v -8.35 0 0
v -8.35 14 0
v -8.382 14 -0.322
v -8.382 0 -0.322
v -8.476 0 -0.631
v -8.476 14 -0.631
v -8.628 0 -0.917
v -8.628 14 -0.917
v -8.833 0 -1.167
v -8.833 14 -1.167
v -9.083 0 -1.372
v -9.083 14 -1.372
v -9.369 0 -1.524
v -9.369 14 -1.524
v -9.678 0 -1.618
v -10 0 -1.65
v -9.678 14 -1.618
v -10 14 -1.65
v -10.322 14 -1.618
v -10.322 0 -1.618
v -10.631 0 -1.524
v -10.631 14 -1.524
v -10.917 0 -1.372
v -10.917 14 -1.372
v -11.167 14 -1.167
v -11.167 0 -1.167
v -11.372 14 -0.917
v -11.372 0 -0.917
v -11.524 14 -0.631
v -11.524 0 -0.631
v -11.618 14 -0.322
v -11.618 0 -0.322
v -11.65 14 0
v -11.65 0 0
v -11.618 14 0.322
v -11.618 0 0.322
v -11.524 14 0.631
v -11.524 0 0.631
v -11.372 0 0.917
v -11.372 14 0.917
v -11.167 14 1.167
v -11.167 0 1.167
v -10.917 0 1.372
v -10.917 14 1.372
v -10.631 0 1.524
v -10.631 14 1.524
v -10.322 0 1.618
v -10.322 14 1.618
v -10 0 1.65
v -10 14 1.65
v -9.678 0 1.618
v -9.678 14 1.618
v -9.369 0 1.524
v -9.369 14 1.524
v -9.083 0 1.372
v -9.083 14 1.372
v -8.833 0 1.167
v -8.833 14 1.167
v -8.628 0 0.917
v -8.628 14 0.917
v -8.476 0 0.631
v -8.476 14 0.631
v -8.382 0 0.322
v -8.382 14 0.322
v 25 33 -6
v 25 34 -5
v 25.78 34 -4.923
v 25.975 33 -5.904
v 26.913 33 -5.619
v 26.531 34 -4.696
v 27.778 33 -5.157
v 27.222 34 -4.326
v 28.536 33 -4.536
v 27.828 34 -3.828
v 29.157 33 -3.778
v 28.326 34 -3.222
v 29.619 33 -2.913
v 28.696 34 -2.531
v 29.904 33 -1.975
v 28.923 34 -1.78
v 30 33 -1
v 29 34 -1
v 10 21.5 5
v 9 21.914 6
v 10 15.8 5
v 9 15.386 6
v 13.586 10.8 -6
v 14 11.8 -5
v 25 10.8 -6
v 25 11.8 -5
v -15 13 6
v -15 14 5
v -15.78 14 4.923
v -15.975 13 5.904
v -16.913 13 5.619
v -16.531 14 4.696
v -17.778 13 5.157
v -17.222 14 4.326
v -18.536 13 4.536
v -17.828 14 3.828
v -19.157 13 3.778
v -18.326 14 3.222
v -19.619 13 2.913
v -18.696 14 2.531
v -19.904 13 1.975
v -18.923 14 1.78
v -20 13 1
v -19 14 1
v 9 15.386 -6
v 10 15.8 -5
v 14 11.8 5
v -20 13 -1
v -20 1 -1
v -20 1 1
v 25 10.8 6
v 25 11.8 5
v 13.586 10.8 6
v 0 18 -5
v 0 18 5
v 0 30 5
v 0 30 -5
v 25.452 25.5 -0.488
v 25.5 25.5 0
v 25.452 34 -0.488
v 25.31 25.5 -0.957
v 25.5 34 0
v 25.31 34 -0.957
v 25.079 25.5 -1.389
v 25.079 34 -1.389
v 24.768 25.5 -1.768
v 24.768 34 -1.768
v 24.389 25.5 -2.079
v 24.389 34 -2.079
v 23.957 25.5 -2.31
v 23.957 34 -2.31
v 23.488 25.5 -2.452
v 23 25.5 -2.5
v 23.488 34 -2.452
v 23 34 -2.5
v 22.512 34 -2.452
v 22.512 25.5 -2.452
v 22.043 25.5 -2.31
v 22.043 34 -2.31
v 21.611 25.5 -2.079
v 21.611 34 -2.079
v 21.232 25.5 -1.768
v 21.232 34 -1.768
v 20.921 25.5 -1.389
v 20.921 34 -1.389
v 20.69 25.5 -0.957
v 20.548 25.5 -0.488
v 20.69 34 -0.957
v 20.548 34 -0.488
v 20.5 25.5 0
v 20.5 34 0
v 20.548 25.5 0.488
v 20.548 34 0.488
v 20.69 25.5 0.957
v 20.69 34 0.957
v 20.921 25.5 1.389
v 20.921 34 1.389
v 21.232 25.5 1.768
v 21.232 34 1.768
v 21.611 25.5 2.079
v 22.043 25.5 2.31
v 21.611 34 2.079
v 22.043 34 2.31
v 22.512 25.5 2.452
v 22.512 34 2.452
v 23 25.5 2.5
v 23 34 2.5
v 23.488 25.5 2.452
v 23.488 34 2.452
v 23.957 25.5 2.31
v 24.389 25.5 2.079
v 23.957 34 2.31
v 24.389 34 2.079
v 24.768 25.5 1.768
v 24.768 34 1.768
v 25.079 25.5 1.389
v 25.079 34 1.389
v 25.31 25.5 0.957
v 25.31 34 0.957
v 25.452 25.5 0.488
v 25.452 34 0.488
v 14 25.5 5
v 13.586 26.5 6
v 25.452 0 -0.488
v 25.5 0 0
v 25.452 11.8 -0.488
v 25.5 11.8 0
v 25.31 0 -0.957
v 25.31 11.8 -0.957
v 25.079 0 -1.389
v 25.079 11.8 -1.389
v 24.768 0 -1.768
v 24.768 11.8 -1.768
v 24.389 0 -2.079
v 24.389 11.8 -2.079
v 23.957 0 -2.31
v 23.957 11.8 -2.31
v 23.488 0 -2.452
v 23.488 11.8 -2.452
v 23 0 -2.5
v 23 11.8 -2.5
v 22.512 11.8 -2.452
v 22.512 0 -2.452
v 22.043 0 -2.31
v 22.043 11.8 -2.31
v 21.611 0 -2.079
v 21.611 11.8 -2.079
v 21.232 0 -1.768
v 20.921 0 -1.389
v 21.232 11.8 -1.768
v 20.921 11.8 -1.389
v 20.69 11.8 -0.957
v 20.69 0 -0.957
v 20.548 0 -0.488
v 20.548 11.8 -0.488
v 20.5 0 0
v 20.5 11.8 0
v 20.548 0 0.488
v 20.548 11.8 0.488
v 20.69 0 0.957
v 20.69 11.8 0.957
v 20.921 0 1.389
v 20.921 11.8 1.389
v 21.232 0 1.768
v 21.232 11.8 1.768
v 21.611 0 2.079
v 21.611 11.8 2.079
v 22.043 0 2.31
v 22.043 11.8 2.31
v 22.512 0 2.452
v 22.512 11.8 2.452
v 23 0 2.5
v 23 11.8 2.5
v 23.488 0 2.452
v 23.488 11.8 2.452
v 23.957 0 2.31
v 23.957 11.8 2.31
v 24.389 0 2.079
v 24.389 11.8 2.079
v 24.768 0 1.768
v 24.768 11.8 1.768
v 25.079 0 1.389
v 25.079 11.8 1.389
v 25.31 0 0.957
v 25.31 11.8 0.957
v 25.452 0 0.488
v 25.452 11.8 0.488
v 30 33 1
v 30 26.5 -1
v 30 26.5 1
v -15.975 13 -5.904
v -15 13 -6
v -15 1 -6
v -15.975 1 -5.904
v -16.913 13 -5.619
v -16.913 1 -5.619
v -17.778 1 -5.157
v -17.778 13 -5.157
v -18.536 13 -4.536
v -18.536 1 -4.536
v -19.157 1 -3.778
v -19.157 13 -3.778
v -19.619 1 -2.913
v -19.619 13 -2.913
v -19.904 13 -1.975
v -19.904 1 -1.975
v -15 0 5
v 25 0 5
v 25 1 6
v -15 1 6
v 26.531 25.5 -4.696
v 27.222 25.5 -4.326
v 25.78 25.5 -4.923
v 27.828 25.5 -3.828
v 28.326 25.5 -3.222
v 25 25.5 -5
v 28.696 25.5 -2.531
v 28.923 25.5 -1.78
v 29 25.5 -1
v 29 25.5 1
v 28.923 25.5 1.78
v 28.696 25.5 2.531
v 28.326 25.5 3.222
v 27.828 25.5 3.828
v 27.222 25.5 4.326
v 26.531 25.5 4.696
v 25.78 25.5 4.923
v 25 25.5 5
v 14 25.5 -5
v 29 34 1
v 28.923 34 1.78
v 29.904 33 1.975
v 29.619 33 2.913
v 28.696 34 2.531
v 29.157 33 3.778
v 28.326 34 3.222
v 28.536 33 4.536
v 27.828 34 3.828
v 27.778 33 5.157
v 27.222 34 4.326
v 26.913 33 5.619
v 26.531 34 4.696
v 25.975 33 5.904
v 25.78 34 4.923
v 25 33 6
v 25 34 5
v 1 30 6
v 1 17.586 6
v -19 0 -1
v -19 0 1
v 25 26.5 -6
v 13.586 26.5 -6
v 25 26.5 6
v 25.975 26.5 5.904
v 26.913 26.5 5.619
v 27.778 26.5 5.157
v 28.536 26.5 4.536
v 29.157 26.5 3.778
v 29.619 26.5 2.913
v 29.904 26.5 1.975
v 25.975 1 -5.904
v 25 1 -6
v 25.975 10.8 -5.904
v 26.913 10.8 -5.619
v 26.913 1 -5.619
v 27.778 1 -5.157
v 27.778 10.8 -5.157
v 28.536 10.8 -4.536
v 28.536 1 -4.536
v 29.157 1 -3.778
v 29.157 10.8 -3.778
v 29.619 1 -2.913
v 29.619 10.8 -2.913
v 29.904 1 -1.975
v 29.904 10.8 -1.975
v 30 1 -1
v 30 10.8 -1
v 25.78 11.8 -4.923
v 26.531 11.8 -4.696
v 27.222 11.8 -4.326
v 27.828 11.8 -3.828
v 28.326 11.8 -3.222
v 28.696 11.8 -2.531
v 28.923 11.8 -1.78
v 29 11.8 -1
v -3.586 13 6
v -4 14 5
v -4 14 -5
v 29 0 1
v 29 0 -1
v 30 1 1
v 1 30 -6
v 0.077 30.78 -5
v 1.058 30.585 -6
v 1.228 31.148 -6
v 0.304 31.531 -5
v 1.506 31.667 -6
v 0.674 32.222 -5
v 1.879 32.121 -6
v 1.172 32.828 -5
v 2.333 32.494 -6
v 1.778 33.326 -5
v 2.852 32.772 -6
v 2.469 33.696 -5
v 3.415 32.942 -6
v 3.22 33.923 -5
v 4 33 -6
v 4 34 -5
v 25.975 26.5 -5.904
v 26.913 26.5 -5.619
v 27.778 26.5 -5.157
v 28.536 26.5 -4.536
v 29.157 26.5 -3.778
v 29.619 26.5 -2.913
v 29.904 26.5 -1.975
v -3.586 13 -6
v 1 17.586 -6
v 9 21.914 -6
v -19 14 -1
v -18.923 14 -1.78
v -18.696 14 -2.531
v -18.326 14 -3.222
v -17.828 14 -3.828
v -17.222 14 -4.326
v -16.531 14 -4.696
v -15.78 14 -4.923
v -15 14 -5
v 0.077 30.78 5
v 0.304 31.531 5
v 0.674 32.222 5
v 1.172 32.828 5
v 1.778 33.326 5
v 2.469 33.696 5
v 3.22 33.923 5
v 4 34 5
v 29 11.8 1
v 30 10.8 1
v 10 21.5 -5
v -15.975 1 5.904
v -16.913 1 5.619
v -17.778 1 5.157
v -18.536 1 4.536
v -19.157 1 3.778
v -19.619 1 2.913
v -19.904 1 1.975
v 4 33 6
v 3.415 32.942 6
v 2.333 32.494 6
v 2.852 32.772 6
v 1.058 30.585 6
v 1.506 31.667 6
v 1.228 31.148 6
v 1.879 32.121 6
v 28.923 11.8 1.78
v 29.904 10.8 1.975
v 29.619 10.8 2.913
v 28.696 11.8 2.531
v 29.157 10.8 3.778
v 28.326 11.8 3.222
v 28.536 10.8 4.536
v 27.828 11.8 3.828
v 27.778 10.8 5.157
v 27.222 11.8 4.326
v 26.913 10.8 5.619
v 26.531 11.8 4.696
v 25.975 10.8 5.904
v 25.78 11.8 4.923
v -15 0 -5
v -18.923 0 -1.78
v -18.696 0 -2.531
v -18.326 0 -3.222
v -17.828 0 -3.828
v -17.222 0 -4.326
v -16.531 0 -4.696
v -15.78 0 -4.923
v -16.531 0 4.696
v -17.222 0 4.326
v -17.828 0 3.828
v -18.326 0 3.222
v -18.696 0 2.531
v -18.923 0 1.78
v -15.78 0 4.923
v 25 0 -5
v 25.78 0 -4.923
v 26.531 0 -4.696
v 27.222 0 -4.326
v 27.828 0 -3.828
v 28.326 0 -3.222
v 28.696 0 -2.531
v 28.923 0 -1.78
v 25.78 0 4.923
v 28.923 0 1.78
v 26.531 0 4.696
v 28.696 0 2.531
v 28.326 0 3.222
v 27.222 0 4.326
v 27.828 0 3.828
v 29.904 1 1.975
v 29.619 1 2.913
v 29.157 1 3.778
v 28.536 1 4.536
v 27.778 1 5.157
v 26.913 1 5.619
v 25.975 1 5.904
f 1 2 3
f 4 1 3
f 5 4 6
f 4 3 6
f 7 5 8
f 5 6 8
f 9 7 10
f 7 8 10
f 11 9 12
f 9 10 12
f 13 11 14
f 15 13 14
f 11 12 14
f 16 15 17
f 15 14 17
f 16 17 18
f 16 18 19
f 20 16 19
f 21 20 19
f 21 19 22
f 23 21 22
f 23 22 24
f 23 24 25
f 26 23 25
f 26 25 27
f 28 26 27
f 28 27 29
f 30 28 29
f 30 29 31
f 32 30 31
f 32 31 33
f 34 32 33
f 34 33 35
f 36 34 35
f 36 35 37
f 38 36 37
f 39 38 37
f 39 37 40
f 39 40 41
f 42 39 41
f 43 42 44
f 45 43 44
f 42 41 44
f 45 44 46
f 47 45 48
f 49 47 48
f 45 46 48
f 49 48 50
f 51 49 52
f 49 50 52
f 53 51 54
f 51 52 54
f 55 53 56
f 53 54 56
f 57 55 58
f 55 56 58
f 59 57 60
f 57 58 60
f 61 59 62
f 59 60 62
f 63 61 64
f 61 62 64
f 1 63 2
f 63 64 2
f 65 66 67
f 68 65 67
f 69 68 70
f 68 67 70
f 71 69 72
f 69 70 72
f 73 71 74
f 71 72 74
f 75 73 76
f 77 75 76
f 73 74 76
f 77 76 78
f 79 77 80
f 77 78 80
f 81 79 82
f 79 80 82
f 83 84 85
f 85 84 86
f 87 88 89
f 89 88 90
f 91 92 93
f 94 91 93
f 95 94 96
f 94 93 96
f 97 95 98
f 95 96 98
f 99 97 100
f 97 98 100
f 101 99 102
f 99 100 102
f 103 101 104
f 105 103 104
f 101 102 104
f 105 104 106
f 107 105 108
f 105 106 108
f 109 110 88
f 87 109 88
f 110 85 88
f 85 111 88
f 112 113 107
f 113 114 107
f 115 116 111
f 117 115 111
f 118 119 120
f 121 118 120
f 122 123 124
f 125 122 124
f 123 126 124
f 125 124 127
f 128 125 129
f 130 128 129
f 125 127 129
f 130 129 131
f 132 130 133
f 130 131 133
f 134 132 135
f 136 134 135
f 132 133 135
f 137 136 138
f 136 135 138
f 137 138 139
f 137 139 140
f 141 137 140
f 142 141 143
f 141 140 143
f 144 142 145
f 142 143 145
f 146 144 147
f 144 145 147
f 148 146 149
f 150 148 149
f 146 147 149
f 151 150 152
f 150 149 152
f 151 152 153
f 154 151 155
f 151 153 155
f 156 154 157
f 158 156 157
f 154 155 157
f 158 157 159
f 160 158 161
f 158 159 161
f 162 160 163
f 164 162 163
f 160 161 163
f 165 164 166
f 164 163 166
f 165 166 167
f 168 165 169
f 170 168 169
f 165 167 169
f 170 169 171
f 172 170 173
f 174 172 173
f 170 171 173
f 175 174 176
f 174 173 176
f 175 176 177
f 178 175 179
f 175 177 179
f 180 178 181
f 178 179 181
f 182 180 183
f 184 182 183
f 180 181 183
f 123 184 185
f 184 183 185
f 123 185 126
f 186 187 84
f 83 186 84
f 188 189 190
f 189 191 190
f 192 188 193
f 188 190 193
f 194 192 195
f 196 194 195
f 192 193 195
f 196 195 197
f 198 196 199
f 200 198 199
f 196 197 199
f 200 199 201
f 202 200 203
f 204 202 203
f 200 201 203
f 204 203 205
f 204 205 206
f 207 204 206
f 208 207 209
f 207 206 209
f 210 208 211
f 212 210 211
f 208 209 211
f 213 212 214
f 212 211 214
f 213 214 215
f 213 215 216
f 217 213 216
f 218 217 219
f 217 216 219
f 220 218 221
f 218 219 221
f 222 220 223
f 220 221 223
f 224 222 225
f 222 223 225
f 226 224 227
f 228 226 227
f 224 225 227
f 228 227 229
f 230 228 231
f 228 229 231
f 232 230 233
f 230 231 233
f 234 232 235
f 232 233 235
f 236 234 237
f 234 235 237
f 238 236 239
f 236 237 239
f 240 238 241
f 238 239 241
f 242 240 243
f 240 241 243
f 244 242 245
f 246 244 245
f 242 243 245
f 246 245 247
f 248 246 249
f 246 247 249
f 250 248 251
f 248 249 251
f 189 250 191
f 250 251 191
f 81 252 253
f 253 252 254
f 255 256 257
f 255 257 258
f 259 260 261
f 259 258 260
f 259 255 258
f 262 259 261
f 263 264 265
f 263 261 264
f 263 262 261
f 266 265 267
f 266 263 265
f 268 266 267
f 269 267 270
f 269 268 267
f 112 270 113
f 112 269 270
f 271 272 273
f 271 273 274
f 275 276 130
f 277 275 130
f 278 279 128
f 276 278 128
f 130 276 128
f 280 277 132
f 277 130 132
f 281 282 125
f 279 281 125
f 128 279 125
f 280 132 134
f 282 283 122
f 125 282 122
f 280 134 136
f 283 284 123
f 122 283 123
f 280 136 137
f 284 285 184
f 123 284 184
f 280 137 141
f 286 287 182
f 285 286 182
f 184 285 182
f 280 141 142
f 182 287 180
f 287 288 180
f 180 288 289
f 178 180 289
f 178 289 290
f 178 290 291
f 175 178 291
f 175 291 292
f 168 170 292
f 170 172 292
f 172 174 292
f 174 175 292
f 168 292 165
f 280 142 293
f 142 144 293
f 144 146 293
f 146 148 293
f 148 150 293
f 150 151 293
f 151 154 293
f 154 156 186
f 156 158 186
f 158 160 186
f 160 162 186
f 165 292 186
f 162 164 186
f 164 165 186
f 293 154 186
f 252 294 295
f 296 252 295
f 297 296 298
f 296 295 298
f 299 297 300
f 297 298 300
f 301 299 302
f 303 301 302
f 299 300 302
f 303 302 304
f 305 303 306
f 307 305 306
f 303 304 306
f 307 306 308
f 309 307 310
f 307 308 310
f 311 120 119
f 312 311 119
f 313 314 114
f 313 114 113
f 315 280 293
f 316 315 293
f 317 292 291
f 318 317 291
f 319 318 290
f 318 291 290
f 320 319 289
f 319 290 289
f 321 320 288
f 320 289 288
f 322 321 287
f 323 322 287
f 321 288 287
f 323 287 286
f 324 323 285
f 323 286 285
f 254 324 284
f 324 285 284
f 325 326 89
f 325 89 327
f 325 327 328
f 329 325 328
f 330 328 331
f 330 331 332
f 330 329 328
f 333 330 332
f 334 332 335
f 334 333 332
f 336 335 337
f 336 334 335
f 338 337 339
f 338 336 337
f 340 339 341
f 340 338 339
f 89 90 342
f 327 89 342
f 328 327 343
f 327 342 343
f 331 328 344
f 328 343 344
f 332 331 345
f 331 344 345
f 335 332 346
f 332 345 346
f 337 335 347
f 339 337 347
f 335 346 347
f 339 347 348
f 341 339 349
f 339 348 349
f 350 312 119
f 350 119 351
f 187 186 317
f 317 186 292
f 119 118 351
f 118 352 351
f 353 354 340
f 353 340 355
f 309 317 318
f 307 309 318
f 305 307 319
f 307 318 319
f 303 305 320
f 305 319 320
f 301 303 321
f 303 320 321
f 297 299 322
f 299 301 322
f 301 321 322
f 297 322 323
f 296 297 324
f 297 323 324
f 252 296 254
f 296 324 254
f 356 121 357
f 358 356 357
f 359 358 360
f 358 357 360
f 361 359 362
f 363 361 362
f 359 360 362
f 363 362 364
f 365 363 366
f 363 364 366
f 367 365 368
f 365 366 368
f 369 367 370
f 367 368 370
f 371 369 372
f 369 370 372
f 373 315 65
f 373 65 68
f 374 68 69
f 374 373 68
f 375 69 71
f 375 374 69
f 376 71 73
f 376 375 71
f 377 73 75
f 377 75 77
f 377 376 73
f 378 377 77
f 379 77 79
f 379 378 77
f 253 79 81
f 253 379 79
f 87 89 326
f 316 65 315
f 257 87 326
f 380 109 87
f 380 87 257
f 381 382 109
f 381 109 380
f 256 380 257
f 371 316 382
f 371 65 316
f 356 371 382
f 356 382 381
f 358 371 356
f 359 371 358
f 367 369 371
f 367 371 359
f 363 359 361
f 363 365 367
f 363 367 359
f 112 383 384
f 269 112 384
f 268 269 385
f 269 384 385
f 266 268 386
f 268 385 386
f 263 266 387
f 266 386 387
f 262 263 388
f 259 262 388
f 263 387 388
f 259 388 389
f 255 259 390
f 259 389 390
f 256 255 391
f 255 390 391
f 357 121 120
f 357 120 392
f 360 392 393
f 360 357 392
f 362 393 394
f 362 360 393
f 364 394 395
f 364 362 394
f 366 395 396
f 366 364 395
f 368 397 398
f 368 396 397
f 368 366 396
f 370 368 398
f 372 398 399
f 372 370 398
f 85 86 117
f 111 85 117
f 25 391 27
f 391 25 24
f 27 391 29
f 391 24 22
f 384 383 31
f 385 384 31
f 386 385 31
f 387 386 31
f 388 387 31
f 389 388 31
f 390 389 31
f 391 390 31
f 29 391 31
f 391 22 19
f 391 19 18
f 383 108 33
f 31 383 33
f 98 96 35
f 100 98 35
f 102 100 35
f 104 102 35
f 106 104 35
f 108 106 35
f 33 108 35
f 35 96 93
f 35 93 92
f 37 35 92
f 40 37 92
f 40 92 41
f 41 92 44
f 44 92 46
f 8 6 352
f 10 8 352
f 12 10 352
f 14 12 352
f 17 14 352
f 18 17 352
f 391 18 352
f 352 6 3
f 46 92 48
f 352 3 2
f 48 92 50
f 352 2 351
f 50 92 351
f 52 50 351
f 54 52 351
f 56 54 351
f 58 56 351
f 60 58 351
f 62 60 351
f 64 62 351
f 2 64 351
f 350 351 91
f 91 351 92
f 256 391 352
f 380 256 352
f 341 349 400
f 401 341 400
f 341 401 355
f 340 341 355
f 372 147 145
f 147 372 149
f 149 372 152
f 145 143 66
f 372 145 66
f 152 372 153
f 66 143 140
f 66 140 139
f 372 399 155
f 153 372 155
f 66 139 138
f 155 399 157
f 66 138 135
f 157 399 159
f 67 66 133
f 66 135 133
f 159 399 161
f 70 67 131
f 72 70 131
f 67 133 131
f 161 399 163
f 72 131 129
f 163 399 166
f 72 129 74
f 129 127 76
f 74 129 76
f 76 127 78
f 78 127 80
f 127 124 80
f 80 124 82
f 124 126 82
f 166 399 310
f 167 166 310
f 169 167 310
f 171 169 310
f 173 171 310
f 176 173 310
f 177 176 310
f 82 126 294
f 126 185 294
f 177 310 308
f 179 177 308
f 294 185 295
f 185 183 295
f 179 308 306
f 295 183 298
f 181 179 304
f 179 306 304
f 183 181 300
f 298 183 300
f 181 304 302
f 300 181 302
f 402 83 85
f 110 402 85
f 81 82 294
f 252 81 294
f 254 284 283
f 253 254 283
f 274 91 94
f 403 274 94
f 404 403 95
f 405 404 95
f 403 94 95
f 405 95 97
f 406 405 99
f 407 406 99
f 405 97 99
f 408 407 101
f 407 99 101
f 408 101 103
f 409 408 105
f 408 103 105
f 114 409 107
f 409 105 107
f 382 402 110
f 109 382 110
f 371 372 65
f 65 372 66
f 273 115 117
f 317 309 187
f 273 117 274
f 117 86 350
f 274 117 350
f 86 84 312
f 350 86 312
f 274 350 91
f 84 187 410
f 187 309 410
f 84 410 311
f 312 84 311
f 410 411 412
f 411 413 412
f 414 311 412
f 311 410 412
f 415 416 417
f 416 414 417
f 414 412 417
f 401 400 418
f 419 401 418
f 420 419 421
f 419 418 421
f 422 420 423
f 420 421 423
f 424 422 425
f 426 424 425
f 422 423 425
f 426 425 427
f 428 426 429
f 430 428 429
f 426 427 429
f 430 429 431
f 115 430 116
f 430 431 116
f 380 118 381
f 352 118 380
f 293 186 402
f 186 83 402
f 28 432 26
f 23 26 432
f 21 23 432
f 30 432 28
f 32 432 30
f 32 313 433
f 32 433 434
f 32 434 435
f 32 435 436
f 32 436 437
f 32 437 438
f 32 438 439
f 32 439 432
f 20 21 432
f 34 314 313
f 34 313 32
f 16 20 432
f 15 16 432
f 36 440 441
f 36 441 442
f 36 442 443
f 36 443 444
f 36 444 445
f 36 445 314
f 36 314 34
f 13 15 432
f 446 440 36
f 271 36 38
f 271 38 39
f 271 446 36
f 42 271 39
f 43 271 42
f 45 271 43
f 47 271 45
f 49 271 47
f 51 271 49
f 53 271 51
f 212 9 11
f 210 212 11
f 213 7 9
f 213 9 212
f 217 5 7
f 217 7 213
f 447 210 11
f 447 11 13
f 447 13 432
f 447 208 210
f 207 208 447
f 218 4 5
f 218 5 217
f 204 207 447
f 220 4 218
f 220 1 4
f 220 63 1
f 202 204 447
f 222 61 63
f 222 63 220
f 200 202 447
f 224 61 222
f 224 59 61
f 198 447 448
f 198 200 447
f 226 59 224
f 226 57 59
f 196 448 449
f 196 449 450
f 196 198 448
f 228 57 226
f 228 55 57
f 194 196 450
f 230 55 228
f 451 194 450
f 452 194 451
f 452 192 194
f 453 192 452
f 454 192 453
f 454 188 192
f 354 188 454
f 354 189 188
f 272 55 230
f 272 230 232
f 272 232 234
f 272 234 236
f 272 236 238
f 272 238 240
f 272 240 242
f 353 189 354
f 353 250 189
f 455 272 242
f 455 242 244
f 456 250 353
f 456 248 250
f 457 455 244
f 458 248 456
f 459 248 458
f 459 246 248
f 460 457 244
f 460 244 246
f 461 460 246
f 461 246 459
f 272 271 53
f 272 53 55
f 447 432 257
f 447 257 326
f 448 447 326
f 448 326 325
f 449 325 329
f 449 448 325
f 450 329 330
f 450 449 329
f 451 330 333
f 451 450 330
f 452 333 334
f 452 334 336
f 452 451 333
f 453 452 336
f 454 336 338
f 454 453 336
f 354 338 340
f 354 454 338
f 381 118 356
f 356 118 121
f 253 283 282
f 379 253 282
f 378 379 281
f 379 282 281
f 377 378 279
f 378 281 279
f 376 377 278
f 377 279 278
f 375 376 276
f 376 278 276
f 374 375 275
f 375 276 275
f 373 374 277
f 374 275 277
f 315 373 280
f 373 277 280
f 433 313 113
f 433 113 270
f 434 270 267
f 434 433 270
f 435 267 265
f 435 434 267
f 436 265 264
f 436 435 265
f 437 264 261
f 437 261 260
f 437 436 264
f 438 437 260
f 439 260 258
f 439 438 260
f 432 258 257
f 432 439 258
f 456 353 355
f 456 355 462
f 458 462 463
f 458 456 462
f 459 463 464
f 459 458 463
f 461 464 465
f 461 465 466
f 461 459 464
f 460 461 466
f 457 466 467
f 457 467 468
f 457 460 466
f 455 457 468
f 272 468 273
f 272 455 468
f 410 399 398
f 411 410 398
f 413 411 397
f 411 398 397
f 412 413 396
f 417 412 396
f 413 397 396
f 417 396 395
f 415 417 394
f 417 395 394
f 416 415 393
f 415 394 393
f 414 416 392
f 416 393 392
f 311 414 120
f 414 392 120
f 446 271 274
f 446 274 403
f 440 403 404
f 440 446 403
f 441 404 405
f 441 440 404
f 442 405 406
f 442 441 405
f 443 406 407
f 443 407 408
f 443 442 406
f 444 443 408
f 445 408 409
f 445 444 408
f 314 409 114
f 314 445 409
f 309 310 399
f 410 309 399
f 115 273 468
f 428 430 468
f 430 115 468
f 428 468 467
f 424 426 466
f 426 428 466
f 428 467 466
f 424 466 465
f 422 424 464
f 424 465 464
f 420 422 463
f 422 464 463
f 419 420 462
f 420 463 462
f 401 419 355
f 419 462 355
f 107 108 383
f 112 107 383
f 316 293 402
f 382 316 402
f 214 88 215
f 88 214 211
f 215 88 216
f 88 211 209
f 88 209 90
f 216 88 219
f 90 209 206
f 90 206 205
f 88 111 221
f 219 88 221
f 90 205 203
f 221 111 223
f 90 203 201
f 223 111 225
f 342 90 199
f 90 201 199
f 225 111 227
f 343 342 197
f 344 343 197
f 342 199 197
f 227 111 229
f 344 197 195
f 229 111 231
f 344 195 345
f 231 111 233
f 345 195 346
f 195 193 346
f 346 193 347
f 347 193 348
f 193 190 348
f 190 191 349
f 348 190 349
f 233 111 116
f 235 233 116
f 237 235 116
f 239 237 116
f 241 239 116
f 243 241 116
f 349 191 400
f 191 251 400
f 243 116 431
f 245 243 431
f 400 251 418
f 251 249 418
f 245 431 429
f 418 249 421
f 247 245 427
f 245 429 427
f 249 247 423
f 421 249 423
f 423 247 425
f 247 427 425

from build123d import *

# Parameters (mm, degrees)
BOSS_EXTRUDE1_DEPTH = 6
SKETCH2_R           = 1.65
CUT_EXTRUDE1_DEPTH  = 20
SKETCH3_R           = 2.5
CUT_EXTRUDE2_DEPTH  = 30
CHAMFER1_SIZE       = 4
FILLET1_R           = 4
FILLET2_R           = 5
CHAMFER2_SIZE       = 1


with BuildPart() as part:
    # Sketch1 → Boss-Extrude1 (new body, symmetric)
    with BuildSketch(Plane.XY):
        Polygon((0, 14), (0, 34), (30, 34), (30, 25.5), (10, 25.5), (10, 11.8), (30, 11.8), (30, 0), (0, 0), (-20, 0), (-20, 14), align=None)
    extrude(amount=BOSS_EXTRUDE1_DEPTH, both=True)

    # Sketch2 → Cut-Extrude1 (cut)
    with BuildSketch(Plane(origin=(0, 14, 0), x_dir=(1, 0, 0), z_dir=(0, 1, 0))):
        with Locations((-10, 0)):
            Circle(SKETCH2_R)
    extrude(amount=-CUT_EXTRUDE1_DEPTH, mode=Mode.SUBTRACT)

    # Sketch3 → Cut-Extrude2 (cut, symmetric)
    with BuildSketch(Plane(origin=(0, 11.8, 0), x_dir=(1, 0, 0), z_dir=(0, 1, 0))):
        with Locations((23, 0)):
            Circle(SKETCH3_R)
    extrude(amount=CUT_EXTRUDE2_DEPTH, both=True, mode=Mode.SUBTRACT)

    # Chamfer1
    chamfer1_edges = [part.edges().sort_by_distance(p)[0] for p in [
        (0, 14, 0),
        (10, 25.5, 0),
        (10, 11.8, 0),
    ]]
    chamfer(chamfer1_edges, length=CHAMFER1_SIZE)

    # Fillet1
    fillet1_edges = [part.edges().sort_by_distance(p)[0] for p in [
        (0, 34, 0),
    ]]
    fillet(fillet1_edges, radius=FILLET1_R)

    # Fillet2
    fillet2_edges = [part.edges().sort_by_distance(p)[0] for p in [
        (-20, 7, -6),
        (30, 29.75, -6),
        (30, 5.9, 6),
        (30, 5.9, -6),
        (30, 29.75, 6),
        (-20, 7, 6),
    ]]
    fillet(fillet2_edges, radius=FILLET2_R)

    # Chamfer2
    chamfer2_edges = [part.edges().sort_by_distance(p)[0] for p in [
        (-9.5, 14, -6),
        (-9.5, 14, 6),
        (10, 18.65, -6),
        (10, 18.65, 6),
        (19.5, 25.5, -6),
        (19.5, 25.5, 6),
        (-2, 16, -6),
        (-2, 16, 6),
        (12, 13.8, -6),
        (12, 13.8, 6),
        (12, 23.5, -6),
        (12, 23.5, 6),
        (0, 24, -6),
        (0, 24, 6),
        (1.171572875, 32.828427125, -6),
        (1.171572875, 32.828427125, 6),
        (30, 34, 0),
        (30, 25.5, 0),
        (14.5, 34, -6),
        (14.5, 34, 6),
        (28.535533906, 34, 4.535533906),
        (28.535533906, 34, -4.535533906),
        (19.5, 11.8, -6),
        (5, 0, -6),
        (28.535533906, 25.5, 4.535533906),
        (28.535533906, 25.5, -4.535533906),
        (5, 0, 6),
        (19.5, 11.8, 6),
        (30, 11.8, 0),
        (30, 0, 0),
        (28.535533906, 11.8, 4.535533906),
        (28.535533906, 11.8, -4.535533906),
        (-20, 0, 0),
        (-18.535533906, 0, 4.535533906),
        (-18.535533906, 0, -4.535533906),
        (28.535533906, 0, 4.535533906),
        (28.535533906, 0, -4.535533906),
        (-20, 14, 0),
        (-18.535533906, 14, 4.535533906),
        (-18.535533906, 14, -4.535533906),
    ]]
    chamfer(chamfer2_edges, length=CHAMFER2_SIZE)


solid = part.part
